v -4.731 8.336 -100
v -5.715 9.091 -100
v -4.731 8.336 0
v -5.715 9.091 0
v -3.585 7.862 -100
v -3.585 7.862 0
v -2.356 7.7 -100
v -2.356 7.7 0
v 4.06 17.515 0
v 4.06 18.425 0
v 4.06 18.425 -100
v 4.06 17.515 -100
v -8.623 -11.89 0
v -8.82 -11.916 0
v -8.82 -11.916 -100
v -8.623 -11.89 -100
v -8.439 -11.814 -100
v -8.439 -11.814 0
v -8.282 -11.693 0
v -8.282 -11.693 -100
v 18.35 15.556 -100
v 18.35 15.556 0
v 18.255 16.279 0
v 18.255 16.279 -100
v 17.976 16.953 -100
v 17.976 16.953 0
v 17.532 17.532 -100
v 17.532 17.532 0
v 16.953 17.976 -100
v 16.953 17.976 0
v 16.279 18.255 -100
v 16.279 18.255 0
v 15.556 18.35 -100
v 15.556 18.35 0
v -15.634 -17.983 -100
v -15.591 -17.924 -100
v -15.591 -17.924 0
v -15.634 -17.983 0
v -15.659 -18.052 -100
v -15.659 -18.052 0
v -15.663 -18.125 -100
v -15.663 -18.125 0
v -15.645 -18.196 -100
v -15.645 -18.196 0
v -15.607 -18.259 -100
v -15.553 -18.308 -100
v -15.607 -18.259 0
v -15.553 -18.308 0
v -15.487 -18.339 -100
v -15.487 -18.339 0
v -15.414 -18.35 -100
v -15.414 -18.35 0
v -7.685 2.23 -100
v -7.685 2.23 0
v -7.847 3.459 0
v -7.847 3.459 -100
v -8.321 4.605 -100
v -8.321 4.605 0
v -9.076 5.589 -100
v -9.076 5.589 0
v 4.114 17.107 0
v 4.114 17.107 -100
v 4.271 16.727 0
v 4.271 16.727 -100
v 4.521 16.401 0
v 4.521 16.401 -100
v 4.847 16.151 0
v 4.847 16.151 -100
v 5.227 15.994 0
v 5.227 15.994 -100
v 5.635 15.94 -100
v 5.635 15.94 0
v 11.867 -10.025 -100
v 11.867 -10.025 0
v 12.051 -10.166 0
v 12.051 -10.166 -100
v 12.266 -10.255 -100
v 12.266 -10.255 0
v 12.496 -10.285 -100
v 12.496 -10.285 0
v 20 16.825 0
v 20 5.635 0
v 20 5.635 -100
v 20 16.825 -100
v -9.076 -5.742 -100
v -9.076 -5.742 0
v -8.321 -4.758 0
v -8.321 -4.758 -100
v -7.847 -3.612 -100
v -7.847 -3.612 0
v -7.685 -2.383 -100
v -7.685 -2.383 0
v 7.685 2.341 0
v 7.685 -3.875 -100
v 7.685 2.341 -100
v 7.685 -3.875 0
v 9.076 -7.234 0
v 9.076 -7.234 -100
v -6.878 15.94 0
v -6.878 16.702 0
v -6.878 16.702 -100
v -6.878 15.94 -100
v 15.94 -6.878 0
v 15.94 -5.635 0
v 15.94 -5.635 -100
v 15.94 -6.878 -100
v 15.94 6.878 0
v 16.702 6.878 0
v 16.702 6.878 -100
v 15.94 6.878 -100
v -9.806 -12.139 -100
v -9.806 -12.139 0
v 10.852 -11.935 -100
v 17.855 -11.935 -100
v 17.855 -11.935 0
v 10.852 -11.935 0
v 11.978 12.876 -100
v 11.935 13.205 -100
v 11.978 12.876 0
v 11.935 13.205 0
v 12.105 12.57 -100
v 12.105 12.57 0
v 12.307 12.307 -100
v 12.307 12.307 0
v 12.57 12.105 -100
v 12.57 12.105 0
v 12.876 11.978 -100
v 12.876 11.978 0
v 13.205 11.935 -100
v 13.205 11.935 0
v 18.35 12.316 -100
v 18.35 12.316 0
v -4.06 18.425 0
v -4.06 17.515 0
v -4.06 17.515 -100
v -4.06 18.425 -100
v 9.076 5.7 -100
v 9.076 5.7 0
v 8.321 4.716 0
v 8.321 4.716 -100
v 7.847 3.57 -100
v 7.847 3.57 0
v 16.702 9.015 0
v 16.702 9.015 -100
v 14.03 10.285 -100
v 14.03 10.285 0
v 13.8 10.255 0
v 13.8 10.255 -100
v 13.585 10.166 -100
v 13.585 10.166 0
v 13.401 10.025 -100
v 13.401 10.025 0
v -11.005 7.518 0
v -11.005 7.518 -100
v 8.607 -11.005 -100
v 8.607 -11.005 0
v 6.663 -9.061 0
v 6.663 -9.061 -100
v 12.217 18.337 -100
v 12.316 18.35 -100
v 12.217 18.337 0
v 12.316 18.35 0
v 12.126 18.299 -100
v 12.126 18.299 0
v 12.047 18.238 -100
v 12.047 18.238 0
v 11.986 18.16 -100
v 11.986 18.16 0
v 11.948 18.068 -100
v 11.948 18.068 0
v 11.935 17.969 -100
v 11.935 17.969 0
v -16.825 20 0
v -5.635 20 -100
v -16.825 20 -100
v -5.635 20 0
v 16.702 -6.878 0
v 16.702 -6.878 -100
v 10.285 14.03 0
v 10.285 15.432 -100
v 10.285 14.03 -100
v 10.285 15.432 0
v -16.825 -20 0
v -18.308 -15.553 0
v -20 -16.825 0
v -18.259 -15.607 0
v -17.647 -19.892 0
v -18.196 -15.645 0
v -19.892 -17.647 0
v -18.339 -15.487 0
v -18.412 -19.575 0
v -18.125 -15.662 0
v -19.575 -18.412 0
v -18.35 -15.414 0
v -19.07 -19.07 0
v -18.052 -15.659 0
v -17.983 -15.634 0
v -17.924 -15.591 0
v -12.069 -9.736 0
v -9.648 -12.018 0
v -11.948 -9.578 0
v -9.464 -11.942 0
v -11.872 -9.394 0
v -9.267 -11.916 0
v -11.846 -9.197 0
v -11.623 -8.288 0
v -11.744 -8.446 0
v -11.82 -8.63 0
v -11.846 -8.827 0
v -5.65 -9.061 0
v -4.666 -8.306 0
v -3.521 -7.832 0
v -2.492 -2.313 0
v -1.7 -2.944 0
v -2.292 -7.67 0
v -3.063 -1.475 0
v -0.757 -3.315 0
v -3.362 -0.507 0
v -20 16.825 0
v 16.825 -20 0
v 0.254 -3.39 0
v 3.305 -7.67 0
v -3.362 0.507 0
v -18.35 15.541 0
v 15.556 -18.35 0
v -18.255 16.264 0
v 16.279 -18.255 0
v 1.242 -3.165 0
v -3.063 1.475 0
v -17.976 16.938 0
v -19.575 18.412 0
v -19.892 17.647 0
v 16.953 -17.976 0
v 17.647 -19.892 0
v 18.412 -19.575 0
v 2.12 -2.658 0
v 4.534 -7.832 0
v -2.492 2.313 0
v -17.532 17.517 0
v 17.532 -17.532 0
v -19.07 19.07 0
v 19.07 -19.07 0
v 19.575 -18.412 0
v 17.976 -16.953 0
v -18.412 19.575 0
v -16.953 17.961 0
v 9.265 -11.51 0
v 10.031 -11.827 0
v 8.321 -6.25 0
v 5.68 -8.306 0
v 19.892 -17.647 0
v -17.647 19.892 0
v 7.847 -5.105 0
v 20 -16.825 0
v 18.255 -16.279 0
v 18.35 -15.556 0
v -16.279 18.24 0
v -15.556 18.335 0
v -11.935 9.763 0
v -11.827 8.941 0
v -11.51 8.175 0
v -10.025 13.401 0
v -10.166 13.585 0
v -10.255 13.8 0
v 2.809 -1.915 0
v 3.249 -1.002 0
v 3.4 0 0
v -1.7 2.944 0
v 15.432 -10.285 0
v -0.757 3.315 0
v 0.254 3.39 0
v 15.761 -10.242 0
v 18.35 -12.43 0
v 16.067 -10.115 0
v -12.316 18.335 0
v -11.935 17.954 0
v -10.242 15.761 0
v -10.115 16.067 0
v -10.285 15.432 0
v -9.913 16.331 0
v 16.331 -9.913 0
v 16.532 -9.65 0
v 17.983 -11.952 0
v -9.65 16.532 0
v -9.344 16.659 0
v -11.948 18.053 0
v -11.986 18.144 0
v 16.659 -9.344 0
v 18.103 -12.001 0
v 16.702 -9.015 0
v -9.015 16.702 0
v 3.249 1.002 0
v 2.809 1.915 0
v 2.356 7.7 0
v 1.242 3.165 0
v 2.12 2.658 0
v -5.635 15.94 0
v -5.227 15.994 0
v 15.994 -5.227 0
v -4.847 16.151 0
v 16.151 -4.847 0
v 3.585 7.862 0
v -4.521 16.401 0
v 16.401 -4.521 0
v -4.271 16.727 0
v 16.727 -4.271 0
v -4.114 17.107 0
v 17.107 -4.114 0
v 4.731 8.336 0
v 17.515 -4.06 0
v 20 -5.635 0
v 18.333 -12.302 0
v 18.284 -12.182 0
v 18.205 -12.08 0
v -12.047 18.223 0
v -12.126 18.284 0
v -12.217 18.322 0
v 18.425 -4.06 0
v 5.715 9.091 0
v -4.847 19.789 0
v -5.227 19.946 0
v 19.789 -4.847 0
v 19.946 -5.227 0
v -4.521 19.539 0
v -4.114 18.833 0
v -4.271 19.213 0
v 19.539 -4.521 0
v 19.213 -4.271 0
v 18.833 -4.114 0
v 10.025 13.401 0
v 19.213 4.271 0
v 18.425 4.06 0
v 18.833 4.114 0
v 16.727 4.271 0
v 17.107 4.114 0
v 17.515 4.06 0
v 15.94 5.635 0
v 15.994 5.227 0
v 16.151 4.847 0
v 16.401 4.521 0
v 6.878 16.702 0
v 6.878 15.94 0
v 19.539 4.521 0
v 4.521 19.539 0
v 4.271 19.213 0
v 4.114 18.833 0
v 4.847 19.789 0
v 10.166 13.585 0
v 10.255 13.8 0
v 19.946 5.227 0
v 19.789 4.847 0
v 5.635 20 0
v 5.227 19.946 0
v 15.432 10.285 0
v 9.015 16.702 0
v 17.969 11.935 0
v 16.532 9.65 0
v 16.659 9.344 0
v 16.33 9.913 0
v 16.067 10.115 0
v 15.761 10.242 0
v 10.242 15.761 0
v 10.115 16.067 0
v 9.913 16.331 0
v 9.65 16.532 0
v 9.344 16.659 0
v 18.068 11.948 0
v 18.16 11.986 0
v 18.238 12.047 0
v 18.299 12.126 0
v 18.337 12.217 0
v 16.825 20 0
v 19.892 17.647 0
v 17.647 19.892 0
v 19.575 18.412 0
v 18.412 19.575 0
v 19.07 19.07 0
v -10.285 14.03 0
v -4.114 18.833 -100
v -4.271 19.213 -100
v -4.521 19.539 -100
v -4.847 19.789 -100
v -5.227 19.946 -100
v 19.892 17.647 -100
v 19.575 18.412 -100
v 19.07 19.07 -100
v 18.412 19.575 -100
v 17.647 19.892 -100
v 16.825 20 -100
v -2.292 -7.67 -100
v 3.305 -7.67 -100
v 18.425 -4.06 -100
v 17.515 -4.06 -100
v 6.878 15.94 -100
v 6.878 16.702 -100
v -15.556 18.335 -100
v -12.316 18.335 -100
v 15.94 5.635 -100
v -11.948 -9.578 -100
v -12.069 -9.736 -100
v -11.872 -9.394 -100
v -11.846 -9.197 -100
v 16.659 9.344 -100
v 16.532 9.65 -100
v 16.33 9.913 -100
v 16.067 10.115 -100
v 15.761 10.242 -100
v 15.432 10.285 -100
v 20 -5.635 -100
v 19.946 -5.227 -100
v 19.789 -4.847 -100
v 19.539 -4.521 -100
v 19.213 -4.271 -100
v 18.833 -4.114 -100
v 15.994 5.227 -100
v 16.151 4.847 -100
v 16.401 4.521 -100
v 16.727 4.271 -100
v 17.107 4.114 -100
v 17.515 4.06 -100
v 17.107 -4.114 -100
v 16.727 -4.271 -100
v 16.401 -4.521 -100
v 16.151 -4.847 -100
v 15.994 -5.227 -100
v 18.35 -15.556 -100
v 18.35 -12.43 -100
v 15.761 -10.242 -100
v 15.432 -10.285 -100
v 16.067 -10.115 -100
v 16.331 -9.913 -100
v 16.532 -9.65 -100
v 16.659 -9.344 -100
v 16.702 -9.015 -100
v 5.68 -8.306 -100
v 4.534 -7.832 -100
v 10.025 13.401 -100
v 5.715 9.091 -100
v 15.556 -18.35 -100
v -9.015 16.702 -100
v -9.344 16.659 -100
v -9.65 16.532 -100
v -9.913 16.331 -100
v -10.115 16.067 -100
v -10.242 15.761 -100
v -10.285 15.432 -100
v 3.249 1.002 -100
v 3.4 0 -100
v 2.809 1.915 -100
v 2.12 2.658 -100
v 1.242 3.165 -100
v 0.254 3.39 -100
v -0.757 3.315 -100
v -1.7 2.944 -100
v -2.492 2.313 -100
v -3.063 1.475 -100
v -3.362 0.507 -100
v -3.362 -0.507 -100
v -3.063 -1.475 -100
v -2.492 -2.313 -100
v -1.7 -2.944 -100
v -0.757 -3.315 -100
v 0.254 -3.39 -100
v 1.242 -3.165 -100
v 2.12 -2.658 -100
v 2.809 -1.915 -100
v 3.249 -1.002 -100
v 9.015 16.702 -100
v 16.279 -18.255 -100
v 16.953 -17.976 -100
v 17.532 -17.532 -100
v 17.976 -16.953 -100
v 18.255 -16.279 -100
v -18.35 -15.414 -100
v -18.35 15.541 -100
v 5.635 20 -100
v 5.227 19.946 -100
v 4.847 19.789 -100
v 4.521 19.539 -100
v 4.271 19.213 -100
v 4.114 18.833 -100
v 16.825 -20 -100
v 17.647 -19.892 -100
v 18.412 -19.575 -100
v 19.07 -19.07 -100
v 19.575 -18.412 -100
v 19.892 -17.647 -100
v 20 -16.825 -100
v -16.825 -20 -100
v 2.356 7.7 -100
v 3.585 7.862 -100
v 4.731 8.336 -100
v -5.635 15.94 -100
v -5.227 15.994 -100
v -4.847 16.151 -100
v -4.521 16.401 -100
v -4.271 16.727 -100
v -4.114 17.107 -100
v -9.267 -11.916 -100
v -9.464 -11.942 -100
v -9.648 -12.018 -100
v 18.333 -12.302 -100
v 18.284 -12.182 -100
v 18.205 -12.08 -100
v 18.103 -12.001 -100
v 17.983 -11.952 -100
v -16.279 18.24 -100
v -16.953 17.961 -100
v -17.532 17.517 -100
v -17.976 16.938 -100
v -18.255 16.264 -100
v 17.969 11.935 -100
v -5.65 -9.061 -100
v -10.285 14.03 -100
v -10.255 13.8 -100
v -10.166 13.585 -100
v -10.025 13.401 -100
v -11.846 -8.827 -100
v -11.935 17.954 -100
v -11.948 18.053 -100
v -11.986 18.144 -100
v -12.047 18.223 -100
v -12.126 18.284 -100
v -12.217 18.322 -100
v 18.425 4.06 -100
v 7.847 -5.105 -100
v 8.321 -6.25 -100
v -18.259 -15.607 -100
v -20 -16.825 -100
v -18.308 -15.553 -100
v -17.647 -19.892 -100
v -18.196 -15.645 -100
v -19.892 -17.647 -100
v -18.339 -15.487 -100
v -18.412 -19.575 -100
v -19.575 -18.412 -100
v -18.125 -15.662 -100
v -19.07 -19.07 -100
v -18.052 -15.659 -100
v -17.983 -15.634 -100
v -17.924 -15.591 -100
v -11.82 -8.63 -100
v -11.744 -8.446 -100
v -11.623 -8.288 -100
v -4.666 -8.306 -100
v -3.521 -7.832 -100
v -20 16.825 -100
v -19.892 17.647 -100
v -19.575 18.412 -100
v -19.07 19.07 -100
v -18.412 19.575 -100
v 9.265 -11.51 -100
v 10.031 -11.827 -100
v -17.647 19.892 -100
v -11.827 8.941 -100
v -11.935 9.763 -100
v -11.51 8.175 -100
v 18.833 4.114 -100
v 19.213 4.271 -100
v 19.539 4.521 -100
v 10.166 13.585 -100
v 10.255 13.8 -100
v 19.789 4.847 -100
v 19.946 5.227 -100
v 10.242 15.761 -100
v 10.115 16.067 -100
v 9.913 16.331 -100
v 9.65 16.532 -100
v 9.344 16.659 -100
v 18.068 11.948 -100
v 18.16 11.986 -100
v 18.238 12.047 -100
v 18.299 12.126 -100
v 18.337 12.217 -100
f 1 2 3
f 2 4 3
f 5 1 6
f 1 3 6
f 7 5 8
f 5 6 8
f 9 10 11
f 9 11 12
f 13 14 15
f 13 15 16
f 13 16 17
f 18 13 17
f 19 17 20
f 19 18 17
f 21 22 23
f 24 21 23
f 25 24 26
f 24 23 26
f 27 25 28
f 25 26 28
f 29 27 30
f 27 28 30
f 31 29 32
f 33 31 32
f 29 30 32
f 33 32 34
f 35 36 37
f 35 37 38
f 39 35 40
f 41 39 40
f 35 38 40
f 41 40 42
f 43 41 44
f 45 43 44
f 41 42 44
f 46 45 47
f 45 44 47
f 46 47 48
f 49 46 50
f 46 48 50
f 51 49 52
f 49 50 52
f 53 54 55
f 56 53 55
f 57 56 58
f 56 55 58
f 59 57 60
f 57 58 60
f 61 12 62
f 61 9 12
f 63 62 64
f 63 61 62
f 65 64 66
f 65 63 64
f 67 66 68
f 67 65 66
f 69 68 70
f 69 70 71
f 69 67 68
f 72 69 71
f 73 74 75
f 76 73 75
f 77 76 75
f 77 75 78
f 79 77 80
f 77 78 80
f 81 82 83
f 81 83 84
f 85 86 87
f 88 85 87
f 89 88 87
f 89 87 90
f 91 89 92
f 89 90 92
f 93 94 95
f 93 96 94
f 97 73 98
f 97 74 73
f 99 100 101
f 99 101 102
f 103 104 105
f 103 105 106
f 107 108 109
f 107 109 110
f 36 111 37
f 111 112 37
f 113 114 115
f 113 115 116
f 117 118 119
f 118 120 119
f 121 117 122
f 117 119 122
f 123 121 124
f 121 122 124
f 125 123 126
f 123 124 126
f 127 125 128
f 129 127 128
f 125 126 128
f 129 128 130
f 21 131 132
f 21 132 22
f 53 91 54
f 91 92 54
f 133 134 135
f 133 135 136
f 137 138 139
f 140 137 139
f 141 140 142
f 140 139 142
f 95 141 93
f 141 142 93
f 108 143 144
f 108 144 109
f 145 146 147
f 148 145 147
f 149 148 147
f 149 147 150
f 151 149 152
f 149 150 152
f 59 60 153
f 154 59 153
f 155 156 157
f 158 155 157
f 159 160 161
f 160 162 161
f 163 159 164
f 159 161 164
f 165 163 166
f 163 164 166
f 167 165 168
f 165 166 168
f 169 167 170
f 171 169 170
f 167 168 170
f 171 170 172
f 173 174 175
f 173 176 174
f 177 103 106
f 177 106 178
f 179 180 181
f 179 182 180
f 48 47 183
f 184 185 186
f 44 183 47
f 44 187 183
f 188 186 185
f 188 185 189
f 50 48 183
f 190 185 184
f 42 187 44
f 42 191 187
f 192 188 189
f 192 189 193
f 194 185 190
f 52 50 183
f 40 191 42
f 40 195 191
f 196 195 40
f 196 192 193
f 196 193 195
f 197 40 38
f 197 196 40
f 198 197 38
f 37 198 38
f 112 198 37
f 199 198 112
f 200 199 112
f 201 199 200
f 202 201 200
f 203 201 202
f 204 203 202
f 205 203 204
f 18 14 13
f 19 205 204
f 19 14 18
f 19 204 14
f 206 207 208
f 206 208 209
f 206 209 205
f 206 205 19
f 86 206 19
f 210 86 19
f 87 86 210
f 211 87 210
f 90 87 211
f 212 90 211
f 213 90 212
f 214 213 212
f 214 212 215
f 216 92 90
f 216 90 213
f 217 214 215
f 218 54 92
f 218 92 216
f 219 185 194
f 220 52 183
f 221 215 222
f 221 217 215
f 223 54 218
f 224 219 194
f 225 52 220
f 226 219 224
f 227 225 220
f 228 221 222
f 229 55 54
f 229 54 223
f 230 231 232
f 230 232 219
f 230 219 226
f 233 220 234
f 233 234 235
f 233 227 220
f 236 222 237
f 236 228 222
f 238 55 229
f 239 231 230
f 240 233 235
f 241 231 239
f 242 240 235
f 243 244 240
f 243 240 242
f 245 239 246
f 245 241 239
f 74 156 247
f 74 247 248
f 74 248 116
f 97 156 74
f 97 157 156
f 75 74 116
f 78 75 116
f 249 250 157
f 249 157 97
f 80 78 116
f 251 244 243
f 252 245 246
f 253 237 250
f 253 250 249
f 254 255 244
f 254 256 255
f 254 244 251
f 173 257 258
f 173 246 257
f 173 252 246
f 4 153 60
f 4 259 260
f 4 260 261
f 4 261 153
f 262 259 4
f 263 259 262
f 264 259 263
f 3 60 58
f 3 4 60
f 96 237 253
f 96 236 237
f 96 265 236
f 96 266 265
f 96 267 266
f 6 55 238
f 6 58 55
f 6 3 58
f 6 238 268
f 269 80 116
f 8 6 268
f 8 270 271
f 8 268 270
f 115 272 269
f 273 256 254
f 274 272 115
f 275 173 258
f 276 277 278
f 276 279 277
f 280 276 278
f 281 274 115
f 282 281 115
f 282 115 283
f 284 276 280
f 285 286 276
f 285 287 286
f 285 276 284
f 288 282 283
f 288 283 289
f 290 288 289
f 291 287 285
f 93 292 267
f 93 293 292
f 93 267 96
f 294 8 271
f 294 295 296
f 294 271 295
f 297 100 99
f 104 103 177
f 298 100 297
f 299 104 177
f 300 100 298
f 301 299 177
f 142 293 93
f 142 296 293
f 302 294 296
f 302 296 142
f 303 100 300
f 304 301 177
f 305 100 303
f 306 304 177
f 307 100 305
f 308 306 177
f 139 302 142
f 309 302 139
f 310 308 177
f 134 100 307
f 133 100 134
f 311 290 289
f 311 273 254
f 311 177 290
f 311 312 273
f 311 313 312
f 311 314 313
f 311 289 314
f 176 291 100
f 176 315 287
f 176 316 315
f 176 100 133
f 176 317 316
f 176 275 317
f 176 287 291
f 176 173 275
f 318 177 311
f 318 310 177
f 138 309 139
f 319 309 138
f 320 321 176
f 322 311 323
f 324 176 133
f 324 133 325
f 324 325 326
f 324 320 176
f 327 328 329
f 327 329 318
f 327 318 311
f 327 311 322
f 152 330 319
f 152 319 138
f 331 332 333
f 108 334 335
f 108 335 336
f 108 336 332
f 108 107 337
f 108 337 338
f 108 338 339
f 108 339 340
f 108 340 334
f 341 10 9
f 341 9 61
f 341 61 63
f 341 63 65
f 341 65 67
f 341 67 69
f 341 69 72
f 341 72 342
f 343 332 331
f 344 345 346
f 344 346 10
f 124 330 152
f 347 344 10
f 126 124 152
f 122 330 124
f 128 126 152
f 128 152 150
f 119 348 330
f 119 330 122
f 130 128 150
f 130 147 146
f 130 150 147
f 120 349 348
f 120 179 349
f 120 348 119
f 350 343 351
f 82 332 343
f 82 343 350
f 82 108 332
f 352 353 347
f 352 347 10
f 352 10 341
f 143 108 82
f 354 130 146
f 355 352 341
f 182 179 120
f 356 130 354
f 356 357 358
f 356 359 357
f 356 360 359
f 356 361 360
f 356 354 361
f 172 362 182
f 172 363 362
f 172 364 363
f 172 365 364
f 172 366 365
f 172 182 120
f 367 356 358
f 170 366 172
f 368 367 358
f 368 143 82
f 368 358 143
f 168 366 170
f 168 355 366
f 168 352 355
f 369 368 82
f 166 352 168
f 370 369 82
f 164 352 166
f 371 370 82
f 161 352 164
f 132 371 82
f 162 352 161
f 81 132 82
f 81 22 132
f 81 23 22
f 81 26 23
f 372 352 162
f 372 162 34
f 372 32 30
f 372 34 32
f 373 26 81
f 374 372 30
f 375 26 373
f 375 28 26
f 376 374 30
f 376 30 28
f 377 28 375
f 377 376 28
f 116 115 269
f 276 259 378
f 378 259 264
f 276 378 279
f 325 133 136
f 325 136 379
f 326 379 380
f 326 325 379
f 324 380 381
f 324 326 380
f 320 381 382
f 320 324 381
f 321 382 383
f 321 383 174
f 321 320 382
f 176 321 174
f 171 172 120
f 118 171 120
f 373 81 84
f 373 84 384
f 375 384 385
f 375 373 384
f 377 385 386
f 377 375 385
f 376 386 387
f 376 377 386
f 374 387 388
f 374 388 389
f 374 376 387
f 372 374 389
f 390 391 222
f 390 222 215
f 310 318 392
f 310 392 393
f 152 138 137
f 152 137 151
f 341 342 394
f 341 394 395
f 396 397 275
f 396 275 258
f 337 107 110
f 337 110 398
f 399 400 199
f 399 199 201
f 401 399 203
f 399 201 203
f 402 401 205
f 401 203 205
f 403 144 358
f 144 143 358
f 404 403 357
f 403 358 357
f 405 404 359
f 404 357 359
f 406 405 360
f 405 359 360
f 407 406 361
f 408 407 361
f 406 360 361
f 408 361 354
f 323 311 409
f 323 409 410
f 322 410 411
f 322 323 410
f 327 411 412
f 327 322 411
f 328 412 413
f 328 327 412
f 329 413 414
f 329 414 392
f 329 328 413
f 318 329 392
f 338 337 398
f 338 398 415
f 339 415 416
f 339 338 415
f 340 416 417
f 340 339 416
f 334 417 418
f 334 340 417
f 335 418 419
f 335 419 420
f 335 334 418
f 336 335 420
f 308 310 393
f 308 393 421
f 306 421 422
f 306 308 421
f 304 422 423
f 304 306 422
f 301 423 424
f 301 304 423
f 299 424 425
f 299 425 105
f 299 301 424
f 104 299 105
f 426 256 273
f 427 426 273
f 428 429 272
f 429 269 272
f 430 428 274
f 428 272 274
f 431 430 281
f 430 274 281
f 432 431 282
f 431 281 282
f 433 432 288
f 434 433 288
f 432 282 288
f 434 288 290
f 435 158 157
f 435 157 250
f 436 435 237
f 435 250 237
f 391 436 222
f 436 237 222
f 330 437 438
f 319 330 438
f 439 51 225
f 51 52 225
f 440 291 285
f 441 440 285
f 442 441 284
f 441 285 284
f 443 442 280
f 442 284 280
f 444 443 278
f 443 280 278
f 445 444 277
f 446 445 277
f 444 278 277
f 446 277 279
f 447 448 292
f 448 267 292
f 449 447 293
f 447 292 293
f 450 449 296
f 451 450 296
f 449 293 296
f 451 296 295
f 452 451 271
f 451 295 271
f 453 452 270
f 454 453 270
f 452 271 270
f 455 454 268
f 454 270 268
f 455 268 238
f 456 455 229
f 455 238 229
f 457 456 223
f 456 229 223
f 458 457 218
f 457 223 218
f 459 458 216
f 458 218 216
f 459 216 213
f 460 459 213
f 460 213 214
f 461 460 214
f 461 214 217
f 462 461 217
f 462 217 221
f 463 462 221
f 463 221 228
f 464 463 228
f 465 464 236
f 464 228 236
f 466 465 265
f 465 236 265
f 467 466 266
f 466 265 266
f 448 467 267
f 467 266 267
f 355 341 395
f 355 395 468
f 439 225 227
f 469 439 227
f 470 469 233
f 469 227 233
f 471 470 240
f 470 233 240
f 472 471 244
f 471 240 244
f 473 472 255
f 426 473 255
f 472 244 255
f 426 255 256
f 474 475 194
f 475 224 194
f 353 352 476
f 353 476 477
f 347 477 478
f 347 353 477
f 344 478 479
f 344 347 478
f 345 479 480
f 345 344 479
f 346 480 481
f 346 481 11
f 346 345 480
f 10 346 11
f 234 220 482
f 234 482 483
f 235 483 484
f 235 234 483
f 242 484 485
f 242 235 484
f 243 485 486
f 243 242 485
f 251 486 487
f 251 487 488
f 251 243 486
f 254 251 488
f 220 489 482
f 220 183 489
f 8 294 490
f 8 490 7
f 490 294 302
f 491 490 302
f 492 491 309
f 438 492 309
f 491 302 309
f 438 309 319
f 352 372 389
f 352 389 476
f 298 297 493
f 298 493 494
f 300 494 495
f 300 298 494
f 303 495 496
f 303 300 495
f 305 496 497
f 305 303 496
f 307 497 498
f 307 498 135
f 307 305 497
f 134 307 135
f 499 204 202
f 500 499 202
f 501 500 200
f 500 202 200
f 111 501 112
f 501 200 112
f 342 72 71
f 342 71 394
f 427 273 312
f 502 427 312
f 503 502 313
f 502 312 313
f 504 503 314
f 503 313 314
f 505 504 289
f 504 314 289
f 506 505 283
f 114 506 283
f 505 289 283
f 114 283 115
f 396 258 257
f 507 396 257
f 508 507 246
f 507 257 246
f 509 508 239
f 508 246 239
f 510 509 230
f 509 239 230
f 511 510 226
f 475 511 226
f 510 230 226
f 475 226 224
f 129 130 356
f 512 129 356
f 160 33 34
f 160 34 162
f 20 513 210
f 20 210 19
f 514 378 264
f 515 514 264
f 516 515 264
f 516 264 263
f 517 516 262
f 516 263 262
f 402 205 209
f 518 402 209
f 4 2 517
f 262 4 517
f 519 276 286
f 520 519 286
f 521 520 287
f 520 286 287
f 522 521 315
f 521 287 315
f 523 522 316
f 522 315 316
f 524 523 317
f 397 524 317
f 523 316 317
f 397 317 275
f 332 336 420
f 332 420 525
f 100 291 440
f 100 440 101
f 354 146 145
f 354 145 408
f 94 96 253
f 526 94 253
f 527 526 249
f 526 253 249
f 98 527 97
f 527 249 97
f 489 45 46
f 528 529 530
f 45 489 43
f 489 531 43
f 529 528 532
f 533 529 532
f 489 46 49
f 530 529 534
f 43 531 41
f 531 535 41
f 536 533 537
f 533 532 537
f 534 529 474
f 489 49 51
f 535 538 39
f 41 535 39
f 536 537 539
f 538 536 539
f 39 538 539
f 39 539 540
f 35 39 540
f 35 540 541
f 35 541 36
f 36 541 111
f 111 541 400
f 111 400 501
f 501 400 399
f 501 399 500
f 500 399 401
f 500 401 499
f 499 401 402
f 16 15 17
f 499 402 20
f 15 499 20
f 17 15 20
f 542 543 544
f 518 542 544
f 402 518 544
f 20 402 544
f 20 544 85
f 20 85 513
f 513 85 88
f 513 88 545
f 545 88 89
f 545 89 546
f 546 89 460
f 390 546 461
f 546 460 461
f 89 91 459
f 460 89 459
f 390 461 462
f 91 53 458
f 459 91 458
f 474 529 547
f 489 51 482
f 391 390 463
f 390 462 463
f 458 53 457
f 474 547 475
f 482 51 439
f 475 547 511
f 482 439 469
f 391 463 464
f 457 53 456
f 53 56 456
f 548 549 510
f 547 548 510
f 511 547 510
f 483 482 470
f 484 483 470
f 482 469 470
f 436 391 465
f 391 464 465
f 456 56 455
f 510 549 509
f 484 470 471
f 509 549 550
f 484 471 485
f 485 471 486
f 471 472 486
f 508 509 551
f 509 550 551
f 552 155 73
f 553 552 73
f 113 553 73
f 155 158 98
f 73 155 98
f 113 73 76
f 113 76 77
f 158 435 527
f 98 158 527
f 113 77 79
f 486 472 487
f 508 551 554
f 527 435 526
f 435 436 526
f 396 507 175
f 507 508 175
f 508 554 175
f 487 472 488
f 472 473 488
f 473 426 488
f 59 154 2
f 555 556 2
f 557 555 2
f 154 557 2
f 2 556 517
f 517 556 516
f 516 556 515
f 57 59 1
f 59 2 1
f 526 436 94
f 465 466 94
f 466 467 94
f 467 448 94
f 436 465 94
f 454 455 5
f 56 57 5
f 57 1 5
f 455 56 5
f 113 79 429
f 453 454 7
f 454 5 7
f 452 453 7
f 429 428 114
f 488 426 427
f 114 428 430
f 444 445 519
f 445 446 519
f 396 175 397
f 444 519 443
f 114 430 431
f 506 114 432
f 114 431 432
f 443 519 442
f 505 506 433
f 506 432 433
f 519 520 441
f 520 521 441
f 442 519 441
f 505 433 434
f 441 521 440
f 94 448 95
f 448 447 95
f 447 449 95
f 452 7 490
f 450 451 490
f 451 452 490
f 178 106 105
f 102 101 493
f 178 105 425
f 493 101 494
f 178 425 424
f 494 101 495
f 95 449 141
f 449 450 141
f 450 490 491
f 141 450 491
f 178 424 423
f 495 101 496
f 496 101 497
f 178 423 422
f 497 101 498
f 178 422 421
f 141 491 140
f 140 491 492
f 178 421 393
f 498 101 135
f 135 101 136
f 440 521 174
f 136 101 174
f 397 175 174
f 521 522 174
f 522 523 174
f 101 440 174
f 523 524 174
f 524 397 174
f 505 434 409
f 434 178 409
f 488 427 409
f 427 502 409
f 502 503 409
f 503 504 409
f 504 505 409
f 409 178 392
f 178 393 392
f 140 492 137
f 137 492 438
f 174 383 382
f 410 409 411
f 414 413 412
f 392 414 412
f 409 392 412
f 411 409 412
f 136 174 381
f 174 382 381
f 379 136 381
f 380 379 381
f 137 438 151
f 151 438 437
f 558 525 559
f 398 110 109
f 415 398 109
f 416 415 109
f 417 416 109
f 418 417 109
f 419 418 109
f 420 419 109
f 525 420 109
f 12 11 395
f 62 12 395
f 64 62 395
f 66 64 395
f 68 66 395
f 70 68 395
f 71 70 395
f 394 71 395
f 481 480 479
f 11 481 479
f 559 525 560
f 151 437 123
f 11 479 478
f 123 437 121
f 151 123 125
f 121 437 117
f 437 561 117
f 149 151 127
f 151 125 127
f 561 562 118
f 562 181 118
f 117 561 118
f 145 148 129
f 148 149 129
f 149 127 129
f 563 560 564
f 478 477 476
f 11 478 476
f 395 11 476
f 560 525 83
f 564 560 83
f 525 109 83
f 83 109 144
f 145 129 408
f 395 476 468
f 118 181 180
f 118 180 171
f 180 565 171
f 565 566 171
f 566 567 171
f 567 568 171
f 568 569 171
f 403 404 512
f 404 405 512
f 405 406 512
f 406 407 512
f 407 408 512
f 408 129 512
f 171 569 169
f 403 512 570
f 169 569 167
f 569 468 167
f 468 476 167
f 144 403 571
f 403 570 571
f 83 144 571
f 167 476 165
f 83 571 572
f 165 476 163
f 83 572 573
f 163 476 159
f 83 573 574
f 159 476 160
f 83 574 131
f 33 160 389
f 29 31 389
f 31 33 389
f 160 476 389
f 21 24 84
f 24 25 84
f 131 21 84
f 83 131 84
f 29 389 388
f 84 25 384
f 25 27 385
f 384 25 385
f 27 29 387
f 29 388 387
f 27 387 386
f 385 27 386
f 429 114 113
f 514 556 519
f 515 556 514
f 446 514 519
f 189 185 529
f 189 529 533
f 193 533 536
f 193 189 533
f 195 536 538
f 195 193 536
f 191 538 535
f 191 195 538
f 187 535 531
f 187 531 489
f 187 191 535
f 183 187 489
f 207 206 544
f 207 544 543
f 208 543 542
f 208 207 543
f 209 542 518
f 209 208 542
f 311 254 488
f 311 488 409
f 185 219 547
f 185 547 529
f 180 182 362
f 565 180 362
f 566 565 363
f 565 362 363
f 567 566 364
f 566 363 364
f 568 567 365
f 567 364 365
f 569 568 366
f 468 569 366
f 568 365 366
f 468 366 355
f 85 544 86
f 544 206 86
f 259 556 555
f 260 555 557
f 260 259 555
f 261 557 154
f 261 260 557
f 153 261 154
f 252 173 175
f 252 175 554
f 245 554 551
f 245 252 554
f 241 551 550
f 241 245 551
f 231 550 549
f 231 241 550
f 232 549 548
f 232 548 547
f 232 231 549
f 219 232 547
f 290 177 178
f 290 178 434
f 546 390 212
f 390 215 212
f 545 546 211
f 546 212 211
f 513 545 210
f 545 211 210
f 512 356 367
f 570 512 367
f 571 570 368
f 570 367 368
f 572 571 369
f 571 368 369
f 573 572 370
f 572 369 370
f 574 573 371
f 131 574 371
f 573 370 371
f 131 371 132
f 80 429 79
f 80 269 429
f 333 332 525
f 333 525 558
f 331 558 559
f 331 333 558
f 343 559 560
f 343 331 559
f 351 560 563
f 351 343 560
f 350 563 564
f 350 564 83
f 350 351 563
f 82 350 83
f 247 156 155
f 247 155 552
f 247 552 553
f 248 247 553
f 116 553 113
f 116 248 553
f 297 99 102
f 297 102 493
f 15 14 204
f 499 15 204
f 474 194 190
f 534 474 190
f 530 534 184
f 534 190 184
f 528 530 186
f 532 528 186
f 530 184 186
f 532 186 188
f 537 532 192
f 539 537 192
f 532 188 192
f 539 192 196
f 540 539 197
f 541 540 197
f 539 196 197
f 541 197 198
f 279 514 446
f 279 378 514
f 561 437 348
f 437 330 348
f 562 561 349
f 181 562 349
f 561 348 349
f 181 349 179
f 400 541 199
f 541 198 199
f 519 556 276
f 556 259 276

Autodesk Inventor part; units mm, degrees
ref_plane "YZ Plane" through (0, 0, 0) normal (1, 0, 0) x (0, 1, 0)
ref_plane "XZ Plane" through (0, 0, 0) normal (0, 1, 0) x (-1, 0, 0)
ref_plane "XY Plane" through (0, 0, 0) normal (0, 0, 1) x (1, 0, 0)
sketch "Sketch1" plane through (0, 0, 0) normal (0, 0, 1) x (1, 0, 0)
  arc A0 (17.969, 11.935) -> (18.35, 12.316) centre (17.969, 12.316) ccw
  line L0 (13.205, 11.935) -> (17.969, 11.935)
  arc A1 (11.935, 13.205) -> (13.205, 11.935) centre (13.205, 13.205) ccw
  line L1 (11.935, 17.969) -> (11.935, 13.205)
  arc A2 (12.316, 18.35) -> (11.935, 17.969) centre (12.316, 17.969) ccw
  line L2 (15.556, 18.35) -> (12.316, 18.35)
  arc A3 (18.35, 15.556) -> (15.556, 18.35) centre (15.556, 15.556) ccw
  line L3 (18.35, 12.316) -> (18.35, 15.556)
  circle A4 centre (0, 0) radius 3.4
  arc A5 (-9.0762, -5.7416) -> (-7.685, -2.3829) centre (-12.4348, -2.3829) ccw
  line L4 (-11.6227, -8.288) -> (-9.0762, -5.7416)
  arc A6 (-11.6227, -8.288) -> (-11.8458, -8.8268) centre (-11.0838, -8.8268) ccw
  line L5 (-11.8458, -9.1968) -> (-11.8458, -8.8268)
  arc A7 (-12.069, -9.7356) -> (-11.8458, -9.1968) centre (-12.6078, -9.1968) ccw
  line L6 (-17.924, -15.5906) -> (-12.069, -9.7356)
  arc A8 (-18.35, -15.4141) -> (-17.924, -15.5906) centre (-18.1005, -15.4141) ccw
  line L7 (-18.35, 15.541) -> (-18.35, -15.4141)
  arc A9 (-15.556, 18.335) -> (-18.35, 15.541) centre (-15.556, 15.541) ccw
  line L8 (-12.316, 18.335) -> (-15.556, 18.335)
  arc A10 (-11.935, 17.954) -> (-12.316, 18.335) centre (-12.316, 17.954) ccw
  line L9 (-11.935, 9.7626) -> (-11.935, 17.954)
  arc A11 (-11.935, 9.7626) -> (-11.0051, 7.5175) centre (-8.76, 9.7626) ccw
  line L10 (-9.0762, 5.5886) -> (-11.0051, 7.5175)
  arc A12 (-7.685, 2.23) -> (-9.0762, 5.5886) centre (-12.4348, 2.23) ccw
  line L11 (-7.685, -2.3829) -> (-7.685, 2.23)
  line L12 (-15.4141, -18.35) -> (15.556, -18.35)
  arc A13 (-15.5906, -17.924) -> (-15.4141, -18.35) centre (-15.4141, -18.1005) ccw
  line L13 (-9.8056, -12.139) -> (-15.5906, -17.924)
  arc A14 (-9.2667, -11.9158) -> (-9.8056, -12.139) centre (-9.2667, -12.6778) ccw
  line L14 (-8.8204, -11.9158) -> (-9.2667, -11.9158)
  arc A15 (-8.8204, -11.9158) -> (-8.2816, -11.6926) centre (-8.8204, -11.1538) ccw
  line L15 (-5.6501, -9.0612) -> (-8.2816, -11.6926)
  arc A16 (-2.2915, -7.67) -> (-5.6501, -9.0612) centre (-2.2915, -12.4198) ccw
  line L16 (3.3048, -7.67) -> (-2.2915, -7.67)
  arc A17 (6.6634, -9.0612) -> (3.3048, -7.67) centre (3.3048, -12.4198) ccw
  line L17 (8.6072, -11.0051) -> (6.6634, -9.0612)
  arc A18 (8.6072, -11.0051) -> (10.8523, -11.935) centre (10.8523, -8.76) ccw
  line L18 (17.8551, -11.935) -> (10.8523, -11.935)
  arc A19 (18.35, -12.4299) -> (17.8551, -11.935) centre (17.8551, -12.4299) ccw
  line L19 (18.35, -15.556) -> (18.35, -12.4299)
  arc A20 (15.556, -18.35) -> (18.35, -15.556) centre (15.556, -15.556) ccw
  line L20 (-16.825, -20) -> (16.825, -20)
  arc A21 (16.825, -20) -> (20, -16.825) centre (16.825, -16.825) ccw
  line L21 (20, -16.825) -> (20, -5.6348)
  arc A22 (20, -5.6348) -> (18.4252, -4.06) centre (18.4252, -5.6348) ccw
  line L22 (18.4252, -4.06) -> (17.5148, -4.06)
  arc A23 (17.5148, -4.06) -> (15.94, -5.6348) centre (17.5148, -5.6348) ccw
  line L23 (15.94, -5.6348) -> (15.94, -6.8785)
  line L24 (15.94, -6.8785) -> (16.7025, -6.8785)
  line L25 (16.7025, -6.8785) -> (16.7025, -9.015)
  arc A24 (15.4325, -10.285) -> (16.7025, -9.015) centre (15.4325, -9.015) ccw
  line L26 (15.4325, -10.285) -> (12.4956, -10.285)
  arc A25 (11.867, -10.0246) -> (12.4956, -10.285) centre (12.4956, -9.396) ccw
  line L27 (11.867, -10.0246) -> (9.0762, -7.2338)
  arc A26 (7.685, -3.8752) -> (9.0762, -7.2338) centre (12.4348, -3.8752) ccw
  line L28 (7.685, -3.8752) -> (7.685, 2.341)
  arc A27 (9.0762, 5.6996) -> (7.685, 2.341) centre (12.4348, 2.341) ccw
  line L29 (9.0762, 5.6996) -> (13.4012, 10.0246)
  arc A28 (14.0298, 10.285) -> (13.4012, 10.0246) centre (14.0298, 9.396) ccw
  line L30 (14.0298, 10.285) -> (15.432, 10.285)
  arc A29 (16.702, 9.015) -> (15.432, 10.285) centre (15.432, 9.015) ccw
  line L31 (16.702, 9.015) -> (16.702, 6.8785)
  line L32 (16.702, 6.8785) -> (15.94, 6.8785)
  line L33 (15.94, 6.8785) -> (15.94, 5.6348)
  arc A30 (15.94, 5.6348) -> (17.5148, 4.06) centre (17.5148, 5.6348) ccw
  line L34 (17.5148, 4.06) -> (18.4252, 4.06)
  arc A31 (18.4252, 4.06) -> (20, 5.6348) centre (18.4252, 5.6348) ccw
  line L35 (20, 5.6348) -> (20, 16.825)
  arc A32 (20, 16.825) -> (16.825, 20) centre (16.825, 16.825) ccw
  line L36 (16.825, 20) -> (5.6348, 20)
  arc A33 (5.6348, 20) -> (4.06, 18.4252) centre (5.6348, 18.4252) ccw
  line L37 (4.06, 18.4252) -> (4.06, 17.5148)
  arc A34 (4.06, 17.5148) -> (5.6348, 15.94) centre (5.6348, 17.5148) ccw
  line L38 (5.6348, 15.94) -> (6.8785, 15.94)
  line L39 (6.8785, 15.94) -> (6.8785, 16.7025)
  line L40 (6.8785, 16.7025) -> (9.015, 16.7025)
  arc A35 (10.285, 15.4325) -> (9.015, 16.7025) centre (9.015, 15.4325) ccw
  line L41 (10.285, 15.4325) -> (10.285, 14.0298)
  arc A36 (10.0246, 13.4012) -> (10.285, 14.0298) centre (9.396, 14.0298) ccw
  line L42 (10.0246, 13.4012) -> (5.7146, 9.0912)
  arc A37 (2.356, 7.7) -> (5.7146, 9.0912) centre (2.356, 12.4498) ccw
  line L43 (2.356, 7.7) -> (-2.356, 7.7)
  arc A38 (-5.7146, 9.0912) -> (-2.356, 7.7) centre (-2.356, 12.4498) ccw
  line L44 (-5.7146, 9.0912) -> (-10.0246, 13.4012)
  arc A39 (-10.285, 14.0298) -> (-10.0246, 13.4012) centre (-9.396, 14.0298) ccw
  line L45 (-10.285, 14.0298) -> (-10.285, 15.4325)
  arc A40 (-9.015, 16.7025) -> (-10.285, 15.4325) centre (-9.015, 15.4325) ccw
  line L46 (-9.015, 16.7025) -> (-6.8785, 16.7025)
  line L47 (-6.8785, 16.7025) -> (-6.8785, 15.94)
  line L48 (-6.8785, 15.94) -> (-5.6348, 15.94)
  arc A41 (-5.6348, 15.94) -> (-4.06, 17.5148) centre (-5.6348, 17.5148) ccw
  line L49 (-4.06, 17.5148) -> (-4.06, 18.4252)
  arc A42 (-4.06, 18.4252) -> (-5.6348, 20) centre (-5.6348, 18.4252) ccw
  line L50 (-5.6348, 20) -> (-16.825, 20)
  arc A43 (-16.825, 20) -> (-20, 16.825) centre (-16.825, 16.825) ccw
  line L51 (-20, 16.825) -> (-20, -16.825)
  arc A44 (-20, -16.825) -> (-16.825, -20) centre (-16.825, -16.825) ccw
extrude "Extrusion1" add sketch "Sketch1" against normal blind 100
properties part number "40-4002-BLACK-FB"
